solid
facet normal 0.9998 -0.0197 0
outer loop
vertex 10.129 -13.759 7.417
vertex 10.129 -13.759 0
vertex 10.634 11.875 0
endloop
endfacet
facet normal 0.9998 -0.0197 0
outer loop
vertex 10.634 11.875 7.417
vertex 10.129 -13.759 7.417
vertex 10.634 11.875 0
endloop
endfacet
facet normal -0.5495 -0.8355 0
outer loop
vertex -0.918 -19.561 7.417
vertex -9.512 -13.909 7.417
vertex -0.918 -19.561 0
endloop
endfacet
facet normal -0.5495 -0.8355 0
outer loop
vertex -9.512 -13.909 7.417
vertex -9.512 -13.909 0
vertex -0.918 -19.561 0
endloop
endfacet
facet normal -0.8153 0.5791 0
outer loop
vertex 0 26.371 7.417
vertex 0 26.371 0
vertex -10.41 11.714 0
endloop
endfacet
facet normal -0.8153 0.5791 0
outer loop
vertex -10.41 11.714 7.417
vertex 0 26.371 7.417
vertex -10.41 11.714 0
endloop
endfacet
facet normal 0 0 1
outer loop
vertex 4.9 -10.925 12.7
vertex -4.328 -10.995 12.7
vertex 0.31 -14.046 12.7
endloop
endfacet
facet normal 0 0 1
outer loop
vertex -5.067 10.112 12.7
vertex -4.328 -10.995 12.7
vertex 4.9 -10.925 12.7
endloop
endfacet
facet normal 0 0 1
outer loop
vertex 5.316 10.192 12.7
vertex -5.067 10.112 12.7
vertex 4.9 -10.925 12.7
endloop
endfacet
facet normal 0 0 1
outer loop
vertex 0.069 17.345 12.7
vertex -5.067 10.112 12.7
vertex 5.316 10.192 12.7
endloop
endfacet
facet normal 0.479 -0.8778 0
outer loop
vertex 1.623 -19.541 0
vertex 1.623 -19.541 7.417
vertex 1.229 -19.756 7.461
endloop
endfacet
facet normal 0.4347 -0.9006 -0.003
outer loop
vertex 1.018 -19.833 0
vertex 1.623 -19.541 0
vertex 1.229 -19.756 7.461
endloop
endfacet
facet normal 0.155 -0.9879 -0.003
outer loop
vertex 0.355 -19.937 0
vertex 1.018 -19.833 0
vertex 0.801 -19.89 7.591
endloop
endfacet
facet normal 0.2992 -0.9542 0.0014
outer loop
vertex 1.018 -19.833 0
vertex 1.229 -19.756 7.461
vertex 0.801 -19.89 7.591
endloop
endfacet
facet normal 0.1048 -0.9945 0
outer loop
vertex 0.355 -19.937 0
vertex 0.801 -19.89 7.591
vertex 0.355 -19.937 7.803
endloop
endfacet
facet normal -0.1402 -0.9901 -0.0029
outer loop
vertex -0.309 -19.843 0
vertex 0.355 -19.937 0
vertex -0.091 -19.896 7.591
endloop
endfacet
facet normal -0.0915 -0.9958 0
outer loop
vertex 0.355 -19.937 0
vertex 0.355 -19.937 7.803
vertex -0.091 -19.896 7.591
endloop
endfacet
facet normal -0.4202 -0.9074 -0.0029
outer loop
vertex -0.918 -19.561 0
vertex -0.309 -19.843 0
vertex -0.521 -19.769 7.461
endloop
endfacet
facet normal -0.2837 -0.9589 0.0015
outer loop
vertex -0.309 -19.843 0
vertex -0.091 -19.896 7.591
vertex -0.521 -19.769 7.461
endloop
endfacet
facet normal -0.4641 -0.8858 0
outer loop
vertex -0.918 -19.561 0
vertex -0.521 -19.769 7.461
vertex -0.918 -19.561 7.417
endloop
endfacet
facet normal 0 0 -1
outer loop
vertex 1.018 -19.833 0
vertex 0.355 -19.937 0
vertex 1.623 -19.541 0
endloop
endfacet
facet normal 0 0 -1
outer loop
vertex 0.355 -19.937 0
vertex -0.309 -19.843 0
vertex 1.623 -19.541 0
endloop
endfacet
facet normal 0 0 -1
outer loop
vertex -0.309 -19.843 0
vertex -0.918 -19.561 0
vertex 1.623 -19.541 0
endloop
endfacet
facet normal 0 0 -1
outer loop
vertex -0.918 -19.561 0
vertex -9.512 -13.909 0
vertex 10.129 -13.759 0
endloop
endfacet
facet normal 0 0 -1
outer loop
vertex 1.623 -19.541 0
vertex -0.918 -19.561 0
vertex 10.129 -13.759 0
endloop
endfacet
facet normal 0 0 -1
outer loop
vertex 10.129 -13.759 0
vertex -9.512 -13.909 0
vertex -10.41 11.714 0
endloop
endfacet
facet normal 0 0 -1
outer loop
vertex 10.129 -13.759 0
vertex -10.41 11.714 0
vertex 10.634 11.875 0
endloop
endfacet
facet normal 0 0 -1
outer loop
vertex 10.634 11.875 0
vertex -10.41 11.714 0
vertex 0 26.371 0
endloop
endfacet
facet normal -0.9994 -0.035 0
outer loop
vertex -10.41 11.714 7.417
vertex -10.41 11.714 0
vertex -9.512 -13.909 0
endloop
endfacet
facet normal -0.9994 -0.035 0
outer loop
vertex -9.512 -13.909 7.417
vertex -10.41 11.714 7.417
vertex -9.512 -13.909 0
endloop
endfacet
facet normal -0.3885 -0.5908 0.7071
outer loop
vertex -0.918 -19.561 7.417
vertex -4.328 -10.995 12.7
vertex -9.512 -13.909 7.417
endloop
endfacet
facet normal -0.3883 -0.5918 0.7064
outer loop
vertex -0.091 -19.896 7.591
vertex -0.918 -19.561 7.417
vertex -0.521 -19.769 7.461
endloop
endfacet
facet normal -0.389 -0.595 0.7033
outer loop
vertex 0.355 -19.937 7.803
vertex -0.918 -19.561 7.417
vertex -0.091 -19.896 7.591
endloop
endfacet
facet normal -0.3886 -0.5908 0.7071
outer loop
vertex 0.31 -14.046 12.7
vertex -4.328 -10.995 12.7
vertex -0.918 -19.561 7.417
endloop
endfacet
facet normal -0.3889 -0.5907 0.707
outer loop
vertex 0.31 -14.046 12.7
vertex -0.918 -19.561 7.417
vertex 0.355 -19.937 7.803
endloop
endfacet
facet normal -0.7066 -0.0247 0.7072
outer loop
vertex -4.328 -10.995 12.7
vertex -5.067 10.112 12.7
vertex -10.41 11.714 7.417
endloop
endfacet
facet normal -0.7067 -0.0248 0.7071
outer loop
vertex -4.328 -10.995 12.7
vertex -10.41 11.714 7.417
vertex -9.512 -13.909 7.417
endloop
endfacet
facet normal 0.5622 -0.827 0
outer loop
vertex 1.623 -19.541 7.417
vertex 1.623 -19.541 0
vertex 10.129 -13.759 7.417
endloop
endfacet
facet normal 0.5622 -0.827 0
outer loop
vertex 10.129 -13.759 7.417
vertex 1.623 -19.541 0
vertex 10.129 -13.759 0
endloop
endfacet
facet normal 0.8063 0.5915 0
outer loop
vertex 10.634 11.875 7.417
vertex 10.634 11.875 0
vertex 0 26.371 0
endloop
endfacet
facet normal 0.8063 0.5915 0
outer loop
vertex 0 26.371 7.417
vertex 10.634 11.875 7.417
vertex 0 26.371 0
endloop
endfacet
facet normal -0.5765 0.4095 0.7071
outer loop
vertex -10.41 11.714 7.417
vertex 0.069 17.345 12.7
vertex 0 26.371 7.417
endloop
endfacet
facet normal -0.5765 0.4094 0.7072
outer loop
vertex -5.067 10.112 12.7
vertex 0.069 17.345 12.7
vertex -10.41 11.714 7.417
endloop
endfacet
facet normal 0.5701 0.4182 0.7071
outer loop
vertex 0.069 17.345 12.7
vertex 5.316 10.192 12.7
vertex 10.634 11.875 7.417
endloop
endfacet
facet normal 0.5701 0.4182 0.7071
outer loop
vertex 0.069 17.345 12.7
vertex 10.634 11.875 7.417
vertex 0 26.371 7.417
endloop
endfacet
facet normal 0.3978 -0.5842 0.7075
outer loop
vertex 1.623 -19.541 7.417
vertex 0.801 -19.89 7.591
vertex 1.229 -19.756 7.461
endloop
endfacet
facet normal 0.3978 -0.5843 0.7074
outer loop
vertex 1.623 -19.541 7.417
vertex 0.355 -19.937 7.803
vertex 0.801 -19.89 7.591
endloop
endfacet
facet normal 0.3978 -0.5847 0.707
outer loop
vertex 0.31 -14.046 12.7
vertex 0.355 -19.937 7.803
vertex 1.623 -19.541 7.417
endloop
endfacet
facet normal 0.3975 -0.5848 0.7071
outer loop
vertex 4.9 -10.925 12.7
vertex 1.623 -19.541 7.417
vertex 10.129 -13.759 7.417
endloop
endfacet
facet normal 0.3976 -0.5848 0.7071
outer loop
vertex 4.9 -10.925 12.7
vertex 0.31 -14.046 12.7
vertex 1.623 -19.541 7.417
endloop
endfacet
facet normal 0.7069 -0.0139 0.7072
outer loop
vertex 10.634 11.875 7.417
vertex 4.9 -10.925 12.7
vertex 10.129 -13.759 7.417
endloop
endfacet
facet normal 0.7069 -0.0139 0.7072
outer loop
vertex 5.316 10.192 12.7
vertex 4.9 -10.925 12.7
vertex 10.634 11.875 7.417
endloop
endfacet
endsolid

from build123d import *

# Parameters (mm, degrees)
F2_DEPTH = 12.7
F3_SIZE  = 5.2832
F0_R     = 2.286


with BuildPart() as f2:
    # F1 (on Top) → F2 (new body)
    with BuildSketch(Plane.XY):
        Polygon((10.633536, 11.875212), (0, 26.371382), (0.358835, -20.400941), (10.128893, -13.75857), align=None)
        Polygon((0.358835, -20.400941), (0, 26.371382), (-10.409869, 11.713768), (-9.511987, -13.909254), align=None)
    extrude(amount=F2_DEPTH)

    # F3
    f3_edges = [f2.edges().sort_by_distance(p)[0] for p in [
        (-9.960928, -1.097743, 12.7),
        (-4.576576, -17.155098, 12.7),
        (5.243864, -17.079756, 12.7),
        (10.381214, -0.941679, 12.7),
        (5.316768, 19.123297, 12.7),
        (-5.204935, 19.042575, 12.7),
    ]]
    chamfer(f3_edges, length=F3_SIZE)

    # F0
    f0_edges = [f2.edges().sort_by_distance(p)[0] for p in [
        (0.358835, -20.400941, 3.7084),
    ]]
    fillet(f0_edges, radius=F0_R)


solid = f2.part
